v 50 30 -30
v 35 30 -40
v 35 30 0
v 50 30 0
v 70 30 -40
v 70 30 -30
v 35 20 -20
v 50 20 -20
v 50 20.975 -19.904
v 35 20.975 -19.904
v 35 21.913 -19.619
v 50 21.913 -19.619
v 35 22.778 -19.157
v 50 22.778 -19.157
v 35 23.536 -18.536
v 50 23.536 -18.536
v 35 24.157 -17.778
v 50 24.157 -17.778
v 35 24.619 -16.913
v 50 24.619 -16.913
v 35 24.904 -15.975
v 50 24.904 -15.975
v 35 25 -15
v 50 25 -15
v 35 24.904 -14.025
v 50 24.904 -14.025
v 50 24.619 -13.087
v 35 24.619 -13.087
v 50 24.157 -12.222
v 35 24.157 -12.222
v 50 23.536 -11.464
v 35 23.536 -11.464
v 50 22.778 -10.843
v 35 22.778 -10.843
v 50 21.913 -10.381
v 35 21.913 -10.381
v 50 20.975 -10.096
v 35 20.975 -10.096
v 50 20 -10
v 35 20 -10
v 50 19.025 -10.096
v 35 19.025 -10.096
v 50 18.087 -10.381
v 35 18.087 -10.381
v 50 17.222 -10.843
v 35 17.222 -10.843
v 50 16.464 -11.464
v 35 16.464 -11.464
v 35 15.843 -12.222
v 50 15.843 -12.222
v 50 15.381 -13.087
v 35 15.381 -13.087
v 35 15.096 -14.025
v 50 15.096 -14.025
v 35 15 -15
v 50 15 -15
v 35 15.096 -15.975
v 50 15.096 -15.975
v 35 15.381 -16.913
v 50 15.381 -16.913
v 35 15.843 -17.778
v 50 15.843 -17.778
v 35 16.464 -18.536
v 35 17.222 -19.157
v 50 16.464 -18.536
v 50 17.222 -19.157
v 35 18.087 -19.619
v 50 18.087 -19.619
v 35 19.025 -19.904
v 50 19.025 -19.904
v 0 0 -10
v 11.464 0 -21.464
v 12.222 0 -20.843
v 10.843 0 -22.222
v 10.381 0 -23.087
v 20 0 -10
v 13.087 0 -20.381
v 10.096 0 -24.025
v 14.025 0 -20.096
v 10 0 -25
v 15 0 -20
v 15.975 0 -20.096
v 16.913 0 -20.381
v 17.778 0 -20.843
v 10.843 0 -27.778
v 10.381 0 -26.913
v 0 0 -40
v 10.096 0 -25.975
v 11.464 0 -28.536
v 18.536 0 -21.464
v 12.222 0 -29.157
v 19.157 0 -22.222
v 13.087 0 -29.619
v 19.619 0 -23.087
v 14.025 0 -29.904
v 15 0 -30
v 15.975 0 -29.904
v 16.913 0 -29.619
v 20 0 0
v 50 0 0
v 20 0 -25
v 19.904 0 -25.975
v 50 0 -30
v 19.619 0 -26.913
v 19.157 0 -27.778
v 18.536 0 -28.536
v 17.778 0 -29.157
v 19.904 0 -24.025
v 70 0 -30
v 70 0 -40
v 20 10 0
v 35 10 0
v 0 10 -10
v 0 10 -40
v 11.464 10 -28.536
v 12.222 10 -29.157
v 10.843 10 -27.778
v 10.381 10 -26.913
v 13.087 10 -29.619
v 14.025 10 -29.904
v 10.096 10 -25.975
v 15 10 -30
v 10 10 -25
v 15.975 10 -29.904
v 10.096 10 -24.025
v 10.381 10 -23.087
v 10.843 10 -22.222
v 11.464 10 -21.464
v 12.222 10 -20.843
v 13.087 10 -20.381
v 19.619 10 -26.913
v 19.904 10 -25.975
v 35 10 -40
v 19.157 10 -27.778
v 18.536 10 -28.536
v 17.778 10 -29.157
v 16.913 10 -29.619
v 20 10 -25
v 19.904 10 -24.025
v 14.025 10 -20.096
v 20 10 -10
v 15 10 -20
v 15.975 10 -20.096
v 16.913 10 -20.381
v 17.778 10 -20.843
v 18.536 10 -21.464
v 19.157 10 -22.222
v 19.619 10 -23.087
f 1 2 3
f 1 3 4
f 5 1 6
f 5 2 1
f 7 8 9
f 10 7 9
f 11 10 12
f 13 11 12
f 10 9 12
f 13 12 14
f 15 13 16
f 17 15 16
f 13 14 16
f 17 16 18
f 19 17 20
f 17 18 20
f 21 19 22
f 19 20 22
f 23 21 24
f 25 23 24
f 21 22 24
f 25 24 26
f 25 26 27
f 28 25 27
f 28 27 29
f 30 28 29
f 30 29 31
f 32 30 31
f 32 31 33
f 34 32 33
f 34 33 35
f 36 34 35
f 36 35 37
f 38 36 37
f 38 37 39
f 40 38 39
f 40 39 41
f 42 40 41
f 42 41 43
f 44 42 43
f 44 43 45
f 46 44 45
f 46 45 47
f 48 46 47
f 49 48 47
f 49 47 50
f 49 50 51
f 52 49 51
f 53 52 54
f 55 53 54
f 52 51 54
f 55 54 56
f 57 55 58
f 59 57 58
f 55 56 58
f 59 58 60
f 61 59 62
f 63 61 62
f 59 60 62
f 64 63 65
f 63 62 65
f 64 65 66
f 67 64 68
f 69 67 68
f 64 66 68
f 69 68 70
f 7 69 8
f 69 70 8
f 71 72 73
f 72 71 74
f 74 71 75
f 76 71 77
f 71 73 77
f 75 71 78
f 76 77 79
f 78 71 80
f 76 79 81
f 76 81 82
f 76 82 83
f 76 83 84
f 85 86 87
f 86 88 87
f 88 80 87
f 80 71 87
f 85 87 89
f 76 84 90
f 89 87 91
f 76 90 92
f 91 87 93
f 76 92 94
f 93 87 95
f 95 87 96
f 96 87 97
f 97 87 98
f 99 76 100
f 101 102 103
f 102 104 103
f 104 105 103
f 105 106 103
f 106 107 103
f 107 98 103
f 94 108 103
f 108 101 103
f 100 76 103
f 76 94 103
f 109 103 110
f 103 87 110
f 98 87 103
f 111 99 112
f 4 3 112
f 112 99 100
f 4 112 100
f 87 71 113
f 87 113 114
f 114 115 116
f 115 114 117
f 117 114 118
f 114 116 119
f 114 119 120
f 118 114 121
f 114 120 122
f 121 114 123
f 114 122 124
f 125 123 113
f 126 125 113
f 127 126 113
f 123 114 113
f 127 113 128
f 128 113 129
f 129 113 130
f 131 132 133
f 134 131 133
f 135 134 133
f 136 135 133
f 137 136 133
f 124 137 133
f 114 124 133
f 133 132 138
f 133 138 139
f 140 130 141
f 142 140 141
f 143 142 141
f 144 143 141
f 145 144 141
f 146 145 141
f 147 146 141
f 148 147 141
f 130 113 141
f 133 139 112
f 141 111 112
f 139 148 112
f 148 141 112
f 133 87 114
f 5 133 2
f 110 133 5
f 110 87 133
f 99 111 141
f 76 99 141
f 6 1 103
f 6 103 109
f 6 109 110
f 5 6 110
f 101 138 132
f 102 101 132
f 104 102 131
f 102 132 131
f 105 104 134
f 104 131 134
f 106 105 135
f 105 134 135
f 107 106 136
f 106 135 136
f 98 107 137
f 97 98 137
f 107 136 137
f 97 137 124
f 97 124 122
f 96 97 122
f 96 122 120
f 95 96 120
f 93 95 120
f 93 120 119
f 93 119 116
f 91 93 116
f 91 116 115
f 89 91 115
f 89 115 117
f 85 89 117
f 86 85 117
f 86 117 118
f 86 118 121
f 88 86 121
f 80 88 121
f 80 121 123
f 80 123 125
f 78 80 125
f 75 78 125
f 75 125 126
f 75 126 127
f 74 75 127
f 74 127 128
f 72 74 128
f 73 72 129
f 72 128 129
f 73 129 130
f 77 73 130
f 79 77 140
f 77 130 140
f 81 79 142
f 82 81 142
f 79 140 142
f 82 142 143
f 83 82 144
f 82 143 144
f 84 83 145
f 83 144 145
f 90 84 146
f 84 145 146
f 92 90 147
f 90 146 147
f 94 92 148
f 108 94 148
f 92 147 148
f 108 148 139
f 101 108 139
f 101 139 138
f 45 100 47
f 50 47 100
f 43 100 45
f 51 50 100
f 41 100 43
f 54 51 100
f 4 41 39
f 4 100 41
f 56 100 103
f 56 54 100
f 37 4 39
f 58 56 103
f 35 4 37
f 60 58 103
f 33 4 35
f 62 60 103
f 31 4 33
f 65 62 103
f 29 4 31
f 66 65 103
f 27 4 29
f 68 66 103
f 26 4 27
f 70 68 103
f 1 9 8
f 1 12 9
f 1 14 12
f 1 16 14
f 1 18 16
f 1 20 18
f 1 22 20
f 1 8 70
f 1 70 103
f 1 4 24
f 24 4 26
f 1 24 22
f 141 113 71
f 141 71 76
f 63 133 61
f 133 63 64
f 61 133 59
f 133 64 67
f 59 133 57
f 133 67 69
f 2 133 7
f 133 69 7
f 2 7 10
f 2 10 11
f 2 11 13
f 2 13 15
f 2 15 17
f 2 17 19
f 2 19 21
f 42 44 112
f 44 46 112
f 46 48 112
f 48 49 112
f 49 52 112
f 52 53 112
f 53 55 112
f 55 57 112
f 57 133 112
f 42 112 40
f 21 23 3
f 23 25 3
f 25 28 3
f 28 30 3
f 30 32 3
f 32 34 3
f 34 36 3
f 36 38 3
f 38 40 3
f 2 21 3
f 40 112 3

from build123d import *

# Parameters (mm, degrees)
SKETCH1_W               = 70
SKETCH1_H               = 40
BOSS_EXTRUDE1_DEPTH     = 30
SKETCH3_W               = 20
SKETCH3_H               = 30
CUT_EXTRUDE1_DEPTH      = 1
CUT_EXTRUDE1_DEPTH_BACK = 31
SKETCH4_W               = 35
SKETCH4_H               = 20
CUT_EXTRUDE2_DEPTH      = 41
SKETCH5_R               = 5
CUT_EXTRUDE3_DEPTH      = 30
SKETCH6_W               = 20
SKETCH6_H               = 10
CUT_EXTRUDE4_DEPTH      = 11
SKETCH7_R               = 5
CUT_EXTRUDE5_DEPTH      = 30


with BuildPart() as part:
    # Sketch1 → Boss-Extrude1 (new body)
    with BuildSketch(Plane(origin=(0, 0, 0), x_dir=(1, 0, 0), z_dir=(0, 1, 0))):
        with Locations((35, 20)):
            Rectangle(SKETCH1_W, SKETCH1_H)
    extrude(amount=BOSS_EXTRUDE1_DEPTH)

    # Sketch3 → Cut-Extrude1 (cut, two sides)
    with BuildSketch(Plane(origin=(0, 30, 0), x_dir=(1, 0, 0), z_dir=(0, 1, 0))) as cut_extrude1_sk:
        with Locations((60, 15)):
            Rectangle(SKETCH3_W, SKETCH3_H)
    extrude(amount=CUT_EXTRUDE1_DEPTH, mode=Mode.SUBTRACT)
    extrude(cut_extrude1_sk.sketch, amount=-CUT_EXTRUDE1_DEPTH_BACK, mode=Mode.SUBTRACT)

    # Sketch4 → Cut-Extrude2 (cut, through all)
    with BuildSketch(Plane.XY):
        with Locations((17.5, 20)):
            Rectangle(SKETCH4_W, SKETCH4_H)
    extrude(amount=-CUT_EXTRUDE2_DEPTH, mode=Mode.SUBTRACT)

    # Sketch5 → Cut-Extrude3 (cut)
    with BuildSketch(Plane(origin=(50, 0, 0), x_dir=(0, 0, -1), z_dir=(1, 0, 0))):
        with Locations((15, 20)):
            Circle(SKETCH5_R)
    extrude(amount=-CUT_EXTRUDE3_DEPTH, mode=Mode.SUBTRACT)

    # Sketch6 → Cut-Extrude4 (cut, through all)
    with BuildSketch(Plane(origin=(0, 10, 0), x_dir=(1, 0, 0), z_dir=(0, 1, 0))):
        with Locations((10, 5)):
            Rectangle(SKETCH6_W, SKETCH6_H)
    extrude(amount=-CUT_EXTRUDE4_DEPTH, mode=Mode.SUBTRACT)

    # Sketch7 → Cut-Extrude5 (cut)
    with BuildSketch(Plane(origin=(0, 10, 0), x_dir=(1, 0, 0), z_dir=(0, 1, 0))):
        with Locations((15, 25)):
            Circle(SKETCH7_R)
    extrude(amount=-CUT_EXTRUDE5_DEPTH, mode=Mode.SUBTRACT)


solid = part.part
